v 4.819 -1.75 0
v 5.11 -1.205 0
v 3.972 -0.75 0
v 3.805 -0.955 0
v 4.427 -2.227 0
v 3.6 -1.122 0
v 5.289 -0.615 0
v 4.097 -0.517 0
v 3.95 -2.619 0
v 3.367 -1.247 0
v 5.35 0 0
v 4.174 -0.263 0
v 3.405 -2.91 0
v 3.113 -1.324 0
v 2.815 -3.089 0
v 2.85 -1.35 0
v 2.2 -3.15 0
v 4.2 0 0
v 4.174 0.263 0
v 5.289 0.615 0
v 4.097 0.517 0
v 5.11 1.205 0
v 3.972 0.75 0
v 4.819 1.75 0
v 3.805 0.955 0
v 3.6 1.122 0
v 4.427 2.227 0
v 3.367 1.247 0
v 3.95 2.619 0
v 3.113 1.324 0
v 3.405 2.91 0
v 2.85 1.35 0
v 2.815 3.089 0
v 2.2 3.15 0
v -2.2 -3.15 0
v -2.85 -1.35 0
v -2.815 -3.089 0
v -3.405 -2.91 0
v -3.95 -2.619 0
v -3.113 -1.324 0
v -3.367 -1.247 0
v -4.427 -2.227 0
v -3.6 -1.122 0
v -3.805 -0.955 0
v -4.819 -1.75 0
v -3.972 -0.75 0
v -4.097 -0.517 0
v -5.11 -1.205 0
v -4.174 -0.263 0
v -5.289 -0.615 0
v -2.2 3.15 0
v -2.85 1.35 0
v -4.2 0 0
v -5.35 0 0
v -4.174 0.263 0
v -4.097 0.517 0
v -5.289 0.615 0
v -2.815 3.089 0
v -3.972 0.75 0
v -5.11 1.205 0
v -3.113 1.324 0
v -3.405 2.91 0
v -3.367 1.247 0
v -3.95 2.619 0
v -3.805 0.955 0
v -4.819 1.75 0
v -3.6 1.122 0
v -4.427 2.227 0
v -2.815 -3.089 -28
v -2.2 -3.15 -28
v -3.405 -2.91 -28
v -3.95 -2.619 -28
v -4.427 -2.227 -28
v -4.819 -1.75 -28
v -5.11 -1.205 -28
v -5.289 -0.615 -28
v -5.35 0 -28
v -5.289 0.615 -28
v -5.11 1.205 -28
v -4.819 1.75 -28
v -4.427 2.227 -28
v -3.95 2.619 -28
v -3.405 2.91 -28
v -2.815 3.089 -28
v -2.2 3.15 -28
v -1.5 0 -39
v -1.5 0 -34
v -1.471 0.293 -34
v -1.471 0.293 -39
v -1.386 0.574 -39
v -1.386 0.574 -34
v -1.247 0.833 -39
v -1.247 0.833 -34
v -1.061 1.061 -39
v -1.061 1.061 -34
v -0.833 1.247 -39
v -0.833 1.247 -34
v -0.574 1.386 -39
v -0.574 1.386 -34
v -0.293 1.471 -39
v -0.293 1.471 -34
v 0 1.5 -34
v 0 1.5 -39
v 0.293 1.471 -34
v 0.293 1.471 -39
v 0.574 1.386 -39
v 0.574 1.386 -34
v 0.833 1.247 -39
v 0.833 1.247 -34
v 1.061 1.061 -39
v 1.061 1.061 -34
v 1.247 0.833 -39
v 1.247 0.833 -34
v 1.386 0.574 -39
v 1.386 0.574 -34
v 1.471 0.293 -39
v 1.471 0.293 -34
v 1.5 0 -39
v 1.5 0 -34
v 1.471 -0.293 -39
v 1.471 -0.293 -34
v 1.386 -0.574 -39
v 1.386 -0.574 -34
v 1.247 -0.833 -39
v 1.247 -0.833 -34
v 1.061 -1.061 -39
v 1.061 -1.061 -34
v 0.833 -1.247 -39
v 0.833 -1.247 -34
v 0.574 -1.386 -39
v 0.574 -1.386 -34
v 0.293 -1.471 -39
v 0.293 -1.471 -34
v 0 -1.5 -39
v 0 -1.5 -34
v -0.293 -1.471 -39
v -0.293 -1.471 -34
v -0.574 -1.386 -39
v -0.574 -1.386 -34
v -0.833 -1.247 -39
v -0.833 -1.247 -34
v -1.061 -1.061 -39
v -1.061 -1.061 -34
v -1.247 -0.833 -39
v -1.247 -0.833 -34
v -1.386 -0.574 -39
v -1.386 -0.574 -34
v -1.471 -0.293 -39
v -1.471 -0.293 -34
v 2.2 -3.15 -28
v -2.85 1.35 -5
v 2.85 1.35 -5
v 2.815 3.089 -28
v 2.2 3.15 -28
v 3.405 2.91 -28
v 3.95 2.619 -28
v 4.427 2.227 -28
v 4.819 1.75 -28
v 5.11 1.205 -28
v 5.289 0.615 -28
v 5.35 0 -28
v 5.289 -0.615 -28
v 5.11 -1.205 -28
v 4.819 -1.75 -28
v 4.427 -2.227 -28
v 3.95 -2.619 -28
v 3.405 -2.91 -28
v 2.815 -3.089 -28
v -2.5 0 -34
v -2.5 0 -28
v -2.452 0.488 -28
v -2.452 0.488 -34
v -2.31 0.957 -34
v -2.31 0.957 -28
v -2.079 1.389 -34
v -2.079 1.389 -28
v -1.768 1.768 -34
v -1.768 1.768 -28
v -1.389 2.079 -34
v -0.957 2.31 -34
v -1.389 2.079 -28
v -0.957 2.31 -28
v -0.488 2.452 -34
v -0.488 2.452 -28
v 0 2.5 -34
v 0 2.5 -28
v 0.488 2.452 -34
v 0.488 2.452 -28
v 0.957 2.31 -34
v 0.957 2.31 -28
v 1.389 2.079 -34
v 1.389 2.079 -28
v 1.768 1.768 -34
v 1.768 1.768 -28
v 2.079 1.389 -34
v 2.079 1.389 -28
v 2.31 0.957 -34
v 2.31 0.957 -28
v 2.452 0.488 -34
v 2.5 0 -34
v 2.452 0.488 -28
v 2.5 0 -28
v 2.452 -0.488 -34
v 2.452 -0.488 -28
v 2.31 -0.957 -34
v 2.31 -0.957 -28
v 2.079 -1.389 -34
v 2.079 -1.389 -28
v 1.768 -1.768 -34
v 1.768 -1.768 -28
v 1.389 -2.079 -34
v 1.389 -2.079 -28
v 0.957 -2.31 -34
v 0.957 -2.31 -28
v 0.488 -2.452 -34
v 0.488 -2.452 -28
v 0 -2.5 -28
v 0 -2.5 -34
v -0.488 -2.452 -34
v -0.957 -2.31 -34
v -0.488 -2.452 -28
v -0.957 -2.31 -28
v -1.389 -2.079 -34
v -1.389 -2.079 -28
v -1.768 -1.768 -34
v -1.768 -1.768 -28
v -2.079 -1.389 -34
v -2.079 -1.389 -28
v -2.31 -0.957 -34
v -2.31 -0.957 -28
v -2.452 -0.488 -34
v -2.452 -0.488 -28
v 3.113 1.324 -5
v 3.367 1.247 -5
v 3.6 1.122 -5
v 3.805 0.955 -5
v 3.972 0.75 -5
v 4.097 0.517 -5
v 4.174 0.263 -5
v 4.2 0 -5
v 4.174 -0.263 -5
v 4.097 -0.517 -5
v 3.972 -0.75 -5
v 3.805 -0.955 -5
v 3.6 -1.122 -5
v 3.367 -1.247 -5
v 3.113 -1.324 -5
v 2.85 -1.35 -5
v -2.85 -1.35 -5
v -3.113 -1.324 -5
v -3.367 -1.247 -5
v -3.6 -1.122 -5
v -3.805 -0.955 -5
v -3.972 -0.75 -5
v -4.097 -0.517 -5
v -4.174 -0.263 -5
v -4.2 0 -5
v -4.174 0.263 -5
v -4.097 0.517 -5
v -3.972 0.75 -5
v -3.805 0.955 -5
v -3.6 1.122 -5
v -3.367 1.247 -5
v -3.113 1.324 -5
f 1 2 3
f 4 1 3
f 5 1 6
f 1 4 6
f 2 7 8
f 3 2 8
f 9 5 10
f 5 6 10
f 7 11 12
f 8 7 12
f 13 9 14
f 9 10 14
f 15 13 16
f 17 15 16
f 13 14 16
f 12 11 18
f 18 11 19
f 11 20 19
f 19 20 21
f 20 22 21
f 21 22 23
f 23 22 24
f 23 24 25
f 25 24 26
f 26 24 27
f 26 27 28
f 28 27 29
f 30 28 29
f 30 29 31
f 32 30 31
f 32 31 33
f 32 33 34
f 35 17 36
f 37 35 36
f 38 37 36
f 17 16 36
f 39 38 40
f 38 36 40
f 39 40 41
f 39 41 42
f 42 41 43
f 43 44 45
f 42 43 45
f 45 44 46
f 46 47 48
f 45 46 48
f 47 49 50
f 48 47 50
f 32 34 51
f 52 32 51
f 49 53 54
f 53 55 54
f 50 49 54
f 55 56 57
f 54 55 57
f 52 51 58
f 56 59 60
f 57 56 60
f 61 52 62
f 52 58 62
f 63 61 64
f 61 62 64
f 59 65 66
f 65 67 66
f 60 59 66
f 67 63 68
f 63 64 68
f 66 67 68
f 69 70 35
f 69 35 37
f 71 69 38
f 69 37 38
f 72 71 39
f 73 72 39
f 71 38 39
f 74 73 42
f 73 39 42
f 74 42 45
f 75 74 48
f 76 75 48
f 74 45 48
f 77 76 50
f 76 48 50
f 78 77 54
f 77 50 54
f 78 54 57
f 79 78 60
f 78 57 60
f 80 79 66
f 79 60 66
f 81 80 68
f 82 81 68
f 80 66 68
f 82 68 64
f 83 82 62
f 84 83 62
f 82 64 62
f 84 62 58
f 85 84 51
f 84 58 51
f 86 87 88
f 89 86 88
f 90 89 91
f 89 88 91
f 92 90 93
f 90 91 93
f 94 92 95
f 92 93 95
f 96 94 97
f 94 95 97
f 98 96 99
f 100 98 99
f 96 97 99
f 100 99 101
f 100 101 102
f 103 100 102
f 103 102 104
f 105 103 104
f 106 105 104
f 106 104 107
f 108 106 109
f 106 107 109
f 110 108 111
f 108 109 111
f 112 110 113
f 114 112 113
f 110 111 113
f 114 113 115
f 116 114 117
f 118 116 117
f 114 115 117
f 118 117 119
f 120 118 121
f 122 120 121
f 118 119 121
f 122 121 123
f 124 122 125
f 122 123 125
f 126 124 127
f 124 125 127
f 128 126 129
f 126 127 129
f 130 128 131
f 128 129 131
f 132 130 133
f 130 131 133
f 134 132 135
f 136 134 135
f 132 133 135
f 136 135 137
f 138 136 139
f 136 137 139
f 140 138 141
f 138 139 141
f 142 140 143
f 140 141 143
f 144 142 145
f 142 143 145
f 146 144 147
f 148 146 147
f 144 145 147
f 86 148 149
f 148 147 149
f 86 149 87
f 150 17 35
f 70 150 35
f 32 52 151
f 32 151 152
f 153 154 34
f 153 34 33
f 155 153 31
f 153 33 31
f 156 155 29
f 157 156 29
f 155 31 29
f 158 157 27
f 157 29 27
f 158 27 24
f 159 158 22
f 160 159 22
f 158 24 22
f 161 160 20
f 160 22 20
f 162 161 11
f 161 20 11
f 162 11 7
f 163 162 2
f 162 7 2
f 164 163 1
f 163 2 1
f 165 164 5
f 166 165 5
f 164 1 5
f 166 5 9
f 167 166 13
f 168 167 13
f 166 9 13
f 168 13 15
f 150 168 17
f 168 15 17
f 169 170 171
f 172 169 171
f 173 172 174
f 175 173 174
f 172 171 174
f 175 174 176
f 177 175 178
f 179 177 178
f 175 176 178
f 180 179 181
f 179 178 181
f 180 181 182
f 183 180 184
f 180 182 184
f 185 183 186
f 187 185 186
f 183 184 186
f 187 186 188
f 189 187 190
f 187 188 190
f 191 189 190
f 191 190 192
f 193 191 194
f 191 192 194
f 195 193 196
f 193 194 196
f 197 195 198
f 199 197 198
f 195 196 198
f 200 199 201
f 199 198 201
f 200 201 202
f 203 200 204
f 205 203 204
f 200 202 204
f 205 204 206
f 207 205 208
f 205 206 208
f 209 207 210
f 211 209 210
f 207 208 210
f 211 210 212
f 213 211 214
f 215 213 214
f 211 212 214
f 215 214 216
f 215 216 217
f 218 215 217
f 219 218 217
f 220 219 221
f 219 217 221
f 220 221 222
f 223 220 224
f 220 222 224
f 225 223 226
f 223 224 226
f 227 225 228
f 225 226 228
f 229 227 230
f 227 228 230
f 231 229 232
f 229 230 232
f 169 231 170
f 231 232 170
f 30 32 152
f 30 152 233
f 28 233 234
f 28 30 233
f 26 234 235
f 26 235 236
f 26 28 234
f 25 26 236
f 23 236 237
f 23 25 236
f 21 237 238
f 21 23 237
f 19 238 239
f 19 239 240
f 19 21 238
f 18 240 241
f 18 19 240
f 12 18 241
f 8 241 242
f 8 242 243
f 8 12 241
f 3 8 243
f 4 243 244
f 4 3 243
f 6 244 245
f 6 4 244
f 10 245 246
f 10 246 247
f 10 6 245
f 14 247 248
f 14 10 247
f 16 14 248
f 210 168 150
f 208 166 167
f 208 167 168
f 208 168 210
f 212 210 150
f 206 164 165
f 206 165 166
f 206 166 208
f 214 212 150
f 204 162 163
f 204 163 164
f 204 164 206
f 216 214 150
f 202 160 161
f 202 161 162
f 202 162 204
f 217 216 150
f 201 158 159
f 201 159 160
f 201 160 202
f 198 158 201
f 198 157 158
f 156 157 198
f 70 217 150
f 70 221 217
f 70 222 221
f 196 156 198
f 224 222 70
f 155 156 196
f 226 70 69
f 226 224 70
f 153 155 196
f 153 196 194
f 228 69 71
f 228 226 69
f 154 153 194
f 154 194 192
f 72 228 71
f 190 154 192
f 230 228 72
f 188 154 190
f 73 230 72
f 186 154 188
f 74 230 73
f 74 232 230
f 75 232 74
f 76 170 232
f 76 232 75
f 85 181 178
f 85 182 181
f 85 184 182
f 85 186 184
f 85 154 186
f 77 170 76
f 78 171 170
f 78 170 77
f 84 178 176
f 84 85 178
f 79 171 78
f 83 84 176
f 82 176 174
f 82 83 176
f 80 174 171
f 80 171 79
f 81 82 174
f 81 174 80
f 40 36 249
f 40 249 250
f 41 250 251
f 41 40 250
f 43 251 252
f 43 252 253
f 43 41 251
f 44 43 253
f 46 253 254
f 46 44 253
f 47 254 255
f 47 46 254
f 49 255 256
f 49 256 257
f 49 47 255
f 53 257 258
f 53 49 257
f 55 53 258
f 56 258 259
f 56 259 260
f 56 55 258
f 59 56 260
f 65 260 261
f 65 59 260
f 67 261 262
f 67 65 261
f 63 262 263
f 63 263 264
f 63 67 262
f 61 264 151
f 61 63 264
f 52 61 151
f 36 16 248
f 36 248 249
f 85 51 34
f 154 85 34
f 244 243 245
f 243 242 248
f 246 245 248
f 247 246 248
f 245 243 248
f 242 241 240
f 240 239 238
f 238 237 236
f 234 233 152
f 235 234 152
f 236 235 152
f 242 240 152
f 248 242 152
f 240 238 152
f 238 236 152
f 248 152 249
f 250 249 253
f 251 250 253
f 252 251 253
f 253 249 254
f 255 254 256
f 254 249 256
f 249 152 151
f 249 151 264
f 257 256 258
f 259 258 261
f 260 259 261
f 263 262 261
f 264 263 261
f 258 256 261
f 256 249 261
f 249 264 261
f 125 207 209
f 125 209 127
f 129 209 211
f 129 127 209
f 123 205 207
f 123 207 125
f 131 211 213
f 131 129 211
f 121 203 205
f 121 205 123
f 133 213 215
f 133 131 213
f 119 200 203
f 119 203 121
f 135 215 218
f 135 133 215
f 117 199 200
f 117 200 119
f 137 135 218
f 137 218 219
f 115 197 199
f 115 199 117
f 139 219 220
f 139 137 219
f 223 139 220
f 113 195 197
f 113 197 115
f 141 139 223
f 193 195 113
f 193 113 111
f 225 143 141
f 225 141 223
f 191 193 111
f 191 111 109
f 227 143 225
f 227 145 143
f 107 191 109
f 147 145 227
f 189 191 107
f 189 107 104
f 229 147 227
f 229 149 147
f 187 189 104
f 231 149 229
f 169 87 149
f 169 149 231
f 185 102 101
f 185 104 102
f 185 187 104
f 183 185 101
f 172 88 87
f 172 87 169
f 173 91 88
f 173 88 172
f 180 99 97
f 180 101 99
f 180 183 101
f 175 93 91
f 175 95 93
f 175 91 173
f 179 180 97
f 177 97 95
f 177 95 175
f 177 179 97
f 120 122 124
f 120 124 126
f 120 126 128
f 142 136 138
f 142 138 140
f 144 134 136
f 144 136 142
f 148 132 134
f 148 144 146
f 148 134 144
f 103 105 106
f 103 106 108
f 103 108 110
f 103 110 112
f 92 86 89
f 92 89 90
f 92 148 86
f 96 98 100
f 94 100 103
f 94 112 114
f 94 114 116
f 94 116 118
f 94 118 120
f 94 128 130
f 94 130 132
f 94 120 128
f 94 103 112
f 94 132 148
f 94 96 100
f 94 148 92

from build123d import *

# Parameters (mm, degrees)
BOSS_EXTRUDE1_DEPTH = 28
CUT_EXTRUDE1_DEPTH  = 5
SKETCH3_R           = 2.5
BOSS_EXTRUDE2_DEPTH = 6
SKETCH4_R           = 1.5
BOSS_EXTRUDE3_DEPTH = 5


with BuildPart() as part:
    # Sketch1 → Boss-Extrude1 (new body)
    with BuildSketch(Plane.XY):
        with BuildLine():
            Line((2.2, -3.15), (-2.2, -3.15))
            ThreePointArc((-2.2, -3.15), (-5.35, 0), (-2.2, 3.15))
            Line((-2.2, 3.15), (2.2, 3.15))
            ThreePointArc((2.2, 3.15), (5.35, 0), (2.2, -3.15))
        make_face()
    extrude(amount=-BOSS_EXTRUDE1_DEPTH)

    # Sketch1<3> → Cut-Extrude1 (cut)
    with BuildSketch(Plane.XY):
        with BuildLine():
            Line((2.85, -1.35), (-2.85, -1.35))
            ThreePointArc((-2.85, -1.35), (-4.2, 0), (-2.85, 1.35))
            Line((-2.85, 1.35), (2.85, 1.35))
            ThreePointArc((2.85, 1.35), (4.2, 0), (2.85, -1.35))
        make_face()
    extrude(amount=-CUT_EXTRUDE1_DEPTH, mode=Mode.SUBTRACT)

    # Sketch3 → Boss-Extrude2 (add)
    with BuildSketch(Plane(origin=(0, 0, -28), x_dir=(-1, 0, 0), z_dir=(0, 0, -1))):
        Circle(SKETCH3_R)
    extrude(amount=BOSS_EXTRUDE2_DEPTH)

    # Sketch4 → Boss-Extrude3 (add)
    with BuildSketch(Plane(origin=(0, 0, -34), x_dir=(-1, 0, 0), z_dir=(0, 0, -1))):
        Circle(SKETCH4_R)
    extrude(amount=BOSS_EXTRUDE3_DEPTH)


solid = part.part
